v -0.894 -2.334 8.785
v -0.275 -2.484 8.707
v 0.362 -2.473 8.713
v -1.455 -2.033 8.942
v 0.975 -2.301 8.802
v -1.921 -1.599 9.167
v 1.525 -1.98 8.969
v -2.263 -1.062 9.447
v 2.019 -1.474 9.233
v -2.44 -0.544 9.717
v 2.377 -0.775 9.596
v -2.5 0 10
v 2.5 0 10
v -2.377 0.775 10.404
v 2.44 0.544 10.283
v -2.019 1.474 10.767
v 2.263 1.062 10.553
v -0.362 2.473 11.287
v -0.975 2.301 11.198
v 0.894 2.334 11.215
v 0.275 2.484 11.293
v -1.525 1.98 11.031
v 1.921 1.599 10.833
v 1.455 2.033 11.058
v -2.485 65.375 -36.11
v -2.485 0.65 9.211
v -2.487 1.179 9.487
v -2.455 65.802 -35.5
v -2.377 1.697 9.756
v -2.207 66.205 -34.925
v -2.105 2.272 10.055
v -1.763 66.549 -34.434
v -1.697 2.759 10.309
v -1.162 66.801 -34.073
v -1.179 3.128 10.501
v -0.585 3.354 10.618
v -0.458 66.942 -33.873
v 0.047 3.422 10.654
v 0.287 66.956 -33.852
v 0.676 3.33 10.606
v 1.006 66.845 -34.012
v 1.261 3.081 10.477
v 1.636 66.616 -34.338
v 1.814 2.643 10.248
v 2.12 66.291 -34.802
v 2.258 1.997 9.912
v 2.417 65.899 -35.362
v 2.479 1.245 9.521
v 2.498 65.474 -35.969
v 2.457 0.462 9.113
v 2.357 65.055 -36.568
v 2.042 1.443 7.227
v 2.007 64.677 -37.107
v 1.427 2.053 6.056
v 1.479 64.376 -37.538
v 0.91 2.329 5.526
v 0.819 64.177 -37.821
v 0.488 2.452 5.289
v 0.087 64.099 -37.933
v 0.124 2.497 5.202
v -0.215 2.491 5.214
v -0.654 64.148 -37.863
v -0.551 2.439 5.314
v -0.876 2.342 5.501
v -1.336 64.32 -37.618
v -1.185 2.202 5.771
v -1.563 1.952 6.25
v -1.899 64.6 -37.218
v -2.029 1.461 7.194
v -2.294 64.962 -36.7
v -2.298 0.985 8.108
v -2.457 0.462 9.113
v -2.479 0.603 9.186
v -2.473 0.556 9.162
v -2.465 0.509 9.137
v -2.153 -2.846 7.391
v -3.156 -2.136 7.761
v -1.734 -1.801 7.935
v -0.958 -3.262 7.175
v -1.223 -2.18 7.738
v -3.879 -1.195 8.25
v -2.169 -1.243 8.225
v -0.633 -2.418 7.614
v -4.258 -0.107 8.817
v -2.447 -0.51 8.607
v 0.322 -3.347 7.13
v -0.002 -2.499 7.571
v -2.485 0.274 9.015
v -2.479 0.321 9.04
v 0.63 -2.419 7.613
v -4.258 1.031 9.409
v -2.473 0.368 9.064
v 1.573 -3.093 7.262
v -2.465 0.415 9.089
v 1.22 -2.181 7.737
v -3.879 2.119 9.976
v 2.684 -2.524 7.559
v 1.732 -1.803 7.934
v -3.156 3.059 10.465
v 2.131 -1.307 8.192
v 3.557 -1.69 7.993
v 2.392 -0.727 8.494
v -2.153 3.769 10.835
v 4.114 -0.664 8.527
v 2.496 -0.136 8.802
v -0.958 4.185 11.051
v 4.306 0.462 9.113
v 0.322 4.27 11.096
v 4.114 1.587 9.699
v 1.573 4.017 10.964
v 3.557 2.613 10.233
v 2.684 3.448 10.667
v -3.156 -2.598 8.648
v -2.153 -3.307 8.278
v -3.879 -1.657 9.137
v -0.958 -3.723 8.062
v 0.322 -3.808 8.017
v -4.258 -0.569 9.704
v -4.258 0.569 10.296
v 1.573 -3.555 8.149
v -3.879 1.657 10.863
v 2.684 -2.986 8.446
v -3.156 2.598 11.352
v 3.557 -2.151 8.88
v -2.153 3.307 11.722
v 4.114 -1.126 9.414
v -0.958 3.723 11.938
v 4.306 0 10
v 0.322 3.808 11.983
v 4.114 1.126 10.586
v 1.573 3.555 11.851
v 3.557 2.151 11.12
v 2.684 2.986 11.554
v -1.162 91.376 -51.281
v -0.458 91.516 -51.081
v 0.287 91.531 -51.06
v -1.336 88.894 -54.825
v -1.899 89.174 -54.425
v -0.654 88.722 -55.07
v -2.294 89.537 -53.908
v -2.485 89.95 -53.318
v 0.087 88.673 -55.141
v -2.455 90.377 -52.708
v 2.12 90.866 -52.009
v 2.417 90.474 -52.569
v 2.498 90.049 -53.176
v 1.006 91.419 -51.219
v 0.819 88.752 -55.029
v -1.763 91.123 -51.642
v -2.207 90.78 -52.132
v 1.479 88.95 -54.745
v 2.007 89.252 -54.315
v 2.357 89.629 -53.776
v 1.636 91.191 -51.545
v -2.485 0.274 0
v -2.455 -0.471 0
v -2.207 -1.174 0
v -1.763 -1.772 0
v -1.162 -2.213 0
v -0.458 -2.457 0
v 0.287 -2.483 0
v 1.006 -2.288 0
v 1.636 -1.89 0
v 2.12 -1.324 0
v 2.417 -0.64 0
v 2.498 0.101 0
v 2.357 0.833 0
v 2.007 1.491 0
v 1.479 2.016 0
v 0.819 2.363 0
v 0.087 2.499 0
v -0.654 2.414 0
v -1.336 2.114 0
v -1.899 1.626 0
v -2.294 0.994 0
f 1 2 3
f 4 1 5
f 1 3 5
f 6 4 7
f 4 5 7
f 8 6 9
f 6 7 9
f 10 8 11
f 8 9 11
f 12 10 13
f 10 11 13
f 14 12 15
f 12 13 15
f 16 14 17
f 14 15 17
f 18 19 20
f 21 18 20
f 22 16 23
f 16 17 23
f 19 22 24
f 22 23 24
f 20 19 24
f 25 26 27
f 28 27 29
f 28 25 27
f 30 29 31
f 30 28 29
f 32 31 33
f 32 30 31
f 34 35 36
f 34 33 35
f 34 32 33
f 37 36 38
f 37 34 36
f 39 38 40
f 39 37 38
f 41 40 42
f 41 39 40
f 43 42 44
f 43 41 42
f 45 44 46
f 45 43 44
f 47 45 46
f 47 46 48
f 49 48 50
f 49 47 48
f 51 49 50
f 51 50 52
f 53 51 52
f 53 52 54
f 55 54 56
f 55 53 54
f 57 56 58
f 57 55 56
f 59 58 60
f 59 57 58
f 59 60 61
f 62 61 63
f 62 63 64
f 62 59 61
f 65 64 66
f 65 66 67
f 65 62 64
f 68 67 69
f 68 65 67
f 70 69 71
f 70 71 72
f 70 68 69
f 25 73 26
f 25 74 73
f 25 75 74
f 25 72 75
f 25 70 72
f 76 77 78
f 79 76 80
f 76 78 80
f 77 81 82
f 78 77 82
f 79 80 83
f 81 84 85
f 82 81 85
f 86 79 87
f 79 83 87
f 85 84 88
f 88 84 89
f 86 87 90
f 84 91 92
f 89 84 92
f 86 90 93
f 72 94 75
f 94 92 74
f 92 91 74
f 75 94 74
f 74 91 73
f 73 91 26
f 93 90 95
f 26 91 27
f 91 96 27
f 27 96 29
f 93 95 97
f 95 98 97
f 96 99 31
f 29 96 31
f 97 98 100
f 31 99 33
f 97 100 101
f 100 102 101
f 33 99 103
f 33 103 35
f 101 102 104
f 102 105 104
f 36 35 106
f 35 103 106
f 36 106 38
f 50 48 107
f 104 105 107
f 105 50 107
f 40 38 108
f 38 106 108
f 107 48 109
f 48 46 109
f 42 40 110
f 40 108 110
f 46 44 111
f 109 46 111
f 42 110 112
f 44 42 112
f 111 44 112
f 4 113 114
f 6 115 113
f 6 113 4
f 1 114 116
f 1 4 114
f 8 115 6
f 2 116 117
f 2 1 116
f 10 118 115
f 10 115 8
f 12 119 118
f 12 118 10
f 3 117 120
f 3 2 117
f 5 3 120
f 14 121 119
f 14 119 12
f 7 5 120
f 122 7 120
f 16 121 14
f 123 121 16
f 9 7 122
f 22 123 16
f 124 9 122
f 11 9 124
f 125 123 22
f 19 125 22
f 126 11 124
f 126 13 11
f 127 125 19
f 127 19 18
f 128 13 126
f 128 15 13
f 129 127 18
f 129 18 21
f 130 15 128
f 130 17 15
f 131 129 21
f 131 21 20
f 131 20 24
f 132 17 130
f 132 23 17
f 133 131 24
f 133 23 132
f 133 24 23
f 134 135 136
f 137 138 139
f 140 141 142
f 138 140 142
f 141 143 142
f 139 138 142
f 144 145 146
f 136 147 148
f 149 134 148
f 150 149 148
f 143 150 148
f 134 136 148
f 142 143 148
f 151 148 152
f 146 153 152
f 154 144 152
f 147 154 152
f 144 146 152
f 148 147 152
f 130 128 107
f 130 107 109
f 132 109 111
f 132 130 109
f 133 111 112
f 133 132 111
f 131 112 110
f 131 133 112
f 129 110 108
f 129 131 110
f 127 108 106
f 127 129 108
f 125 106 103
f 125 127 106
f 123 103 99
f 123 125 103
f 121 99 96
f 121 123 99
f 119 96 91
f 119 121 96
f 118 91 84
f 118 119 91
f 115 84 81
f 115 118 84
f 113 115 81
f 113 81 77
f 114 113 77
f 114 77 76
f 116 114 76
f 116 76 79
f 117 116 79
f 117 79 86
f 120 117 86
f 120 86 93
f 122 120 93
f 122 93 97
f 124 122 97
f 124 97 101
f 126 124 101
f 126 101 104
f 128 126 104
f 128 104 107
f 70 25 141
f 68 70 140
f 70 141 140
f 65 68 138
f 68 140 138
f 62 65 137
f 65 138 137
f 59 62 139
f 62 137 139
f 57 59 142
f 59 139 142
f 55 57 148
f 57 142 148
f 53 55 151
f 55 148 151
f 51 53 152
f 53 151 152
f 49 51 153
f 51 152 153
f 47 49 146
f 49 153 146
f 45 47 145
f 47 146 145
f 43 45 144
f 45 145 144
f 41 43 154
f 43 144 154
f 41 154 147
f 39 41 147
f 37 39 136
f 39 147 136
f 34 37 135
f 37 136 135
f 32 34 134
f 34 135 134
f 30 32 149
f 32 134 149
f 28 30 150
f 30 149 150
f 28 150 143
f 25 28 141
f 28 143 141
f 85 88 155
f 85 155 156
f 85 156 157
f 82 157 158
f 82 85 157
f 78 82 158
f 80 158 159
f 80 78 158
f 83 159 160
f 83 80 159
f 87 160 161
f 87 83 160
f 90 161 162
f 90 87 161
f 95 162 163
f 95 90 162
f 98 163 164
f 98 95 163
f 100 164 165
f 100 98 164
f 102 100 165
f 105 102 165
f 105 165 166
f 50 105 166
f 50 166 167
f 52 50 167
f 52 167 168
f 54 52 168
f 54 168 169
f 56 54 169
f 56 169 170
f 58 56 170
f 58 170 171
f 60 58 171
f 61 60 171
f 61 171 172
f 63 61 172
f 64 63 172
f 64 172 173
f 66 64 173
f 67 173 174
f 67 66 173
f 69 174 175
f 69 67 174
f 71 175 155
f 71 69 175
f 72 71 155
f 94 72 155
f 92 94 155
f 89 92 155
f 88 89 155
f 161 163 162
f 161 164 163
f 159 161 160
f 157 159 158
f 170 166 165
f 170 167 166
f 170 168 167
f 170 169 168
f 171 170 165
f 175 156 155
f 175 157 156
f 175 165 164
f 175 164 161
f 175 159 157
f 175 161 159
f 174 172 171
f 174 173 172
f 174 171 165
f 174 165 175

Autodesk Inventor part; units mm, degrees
ref_plane "YZ Plane" through (0, 0, 0) normal (1, 0, 0) x (0, 1, 0)
ref_plane "XZ Plane" through (0, 0, 0) normal (0, 1, 0) x (-1, 0, 0)
ref_plane "XY Plane" through (0, 0, 0) normal (0, 0, 1) x (1, 0, 0)
ref_plane "Work Plane1" through (-18.0552, 1.9841, 10) normal (0, 0, -1) x (-0.994, 0.1092, 0)
ref_plane "Work Plane4" through (0, 0, 10) normal (-0.994, 0.1092, 0) x (-0.1092, -0.994, 0)
ref_plane "Work Plane3" through (-40.2485, 19.0101, 10) normal (-0.994, 0.1092, 0) x (-0.1092, -0.994, 0)
sketch "Sketch1" plane through (0, 0, 10) normal (-1, 0, 0) x (0, -1, 0)
  line L0 (0, -10) -> (0, 0)
  line L1 (0, 0) -> (-65.5322, -45.8861)
  line L2 (-7.1094, 2.5876) -> (7.1094, -2.5876)
  line L3 (-65.5322, -45.8861) -> (-90.1067, -63.0934)
  dimension "d0" = 10
  dimension "d1" = 80
  dimension "d2" = 55
  dimension "d6" = 70
  dimension "d23" = 30
  dimension "d26" = 180
ref_plane "Work Plane7" through (-18.0552, 1.9841, 10) normal (0, 0, -1) x (-0.994, 0.1092, 0)
sketch "Sketch3" plane through (-18.0552, 1.9841, 10) normal (0, 0, -1) x (-0.994, 0.1092, 0)
  circle A0 centre (-18.1638, 0) radius 11.5 projected
  circle A1 centre (-18.1638, 0) radius 2.5
  point P0 (-18.1638, 0)
  dimension "d7" = 5
sweep "Sweep1" add profiles "Sketch3" path "Sketch1" path curves L0 L1 L3 contours A1
sketch "Sketch7" plane through (0, 0, 10) normal (-1, 0, 0) x (0, -1, 0)
  line L0 (0, 0) -> (0, 0) projected
  line L1 (0, 0) -> (0, 0) projected
  line L2 (2.5, -10) -> (-2.5, -10) projected
  line L3 (0, 0) -> (0, 0) projected
  line L4 (0, 0) -> (0, 0) projected
  line L5 (2.5, -10) -> (2.5, 4.8025) projected
  line L6 (-2.5, -10) -> (-2.5, -4.8025) projected
  line L7 (-2.5, -4.8025) -> (0, 0) projected
  line L8 (0, -10) -> (0, 10)
  line L9 (4.3722, -2.276) -> (-21.1551, 11.0126)
  line L10 (-21.1551, 11.0126) -> (5.5876, 18.8192)
  line L11 (5.5876, 18.8192) -> (13.2411, 1.6857)
  line L12 (13.2411, 1.6857) -> (4.3722, -2.276)
  line L13 (-48.3403, -54.2978) -> (-48.6823, -53.3019)
  line L14 (-73.7647, -67.98) -> (-66.6763, -71.8283)
  line L15 (-66.6763, -71.8283) -> (-47.7403, -64.4229)
  line L16 (-47.7403, -64.4229) -> (-48.3403, -54.2978)
  line L17 (-55.533, -59.0685) -> (-56.5685, -56.5685) projected
  line L18 (-48.6823, -53.3019) -> (-76.2479, -64.72)
  line L19 (-76.2479, -64.72) -> (-73.7647, -67.98)
  point P0 (-65.0552, -65.9873)
extrude "Extrusion4" cut sketch "Sketch7" along normal mid plane 10 contours L9 L10 L11 L12
sketch "Sketch8" plane through (0, 0, 10) normal (0, -0.4617, 0.887) x (1, 0, 0)
  ellipse E0 centre (0, 0) end of major axis (0, 2.8185) minor radius 2.5 (2.5, 0) -> (-2.5, 0) ccw projected
  ellipse E1 centre (0, 0) end of major axis (0, -2.8185) minor radius 2.5 (-2.5, 0) -> (2.5, 0) ccw projected
  circle A0 centre (0, 0) radius 4.3056
  point P0 (0, -4.6175)
extrude "Extrusion5" add sketch "Sketch8" against normal blind 1 contours E1 E0 | A0
sketch "Sketch9" plane through (-6.4984, 57.0254, -46.7578) normal (0, -0.3827, -0.9239) x (0, -0.9239, 0.3827)
  ellipse E0 centre (0.4945, -6.4984) end of major axis (-6.0383, -6.4984) minor radius 2.5 projected
  circle A0 centre (0.4945, -6.4984) radius 10.9648
  point P0 (70.578, -6.4984)
extrude "Extrusion6" [suppressed]
ref_plane "Work Plane2" through (-1.6385, -14.9102, 10) normal (0, 0, 1) x (0.994, -0.1092, 0)
properties part number "cellSTORM_lightpath"
